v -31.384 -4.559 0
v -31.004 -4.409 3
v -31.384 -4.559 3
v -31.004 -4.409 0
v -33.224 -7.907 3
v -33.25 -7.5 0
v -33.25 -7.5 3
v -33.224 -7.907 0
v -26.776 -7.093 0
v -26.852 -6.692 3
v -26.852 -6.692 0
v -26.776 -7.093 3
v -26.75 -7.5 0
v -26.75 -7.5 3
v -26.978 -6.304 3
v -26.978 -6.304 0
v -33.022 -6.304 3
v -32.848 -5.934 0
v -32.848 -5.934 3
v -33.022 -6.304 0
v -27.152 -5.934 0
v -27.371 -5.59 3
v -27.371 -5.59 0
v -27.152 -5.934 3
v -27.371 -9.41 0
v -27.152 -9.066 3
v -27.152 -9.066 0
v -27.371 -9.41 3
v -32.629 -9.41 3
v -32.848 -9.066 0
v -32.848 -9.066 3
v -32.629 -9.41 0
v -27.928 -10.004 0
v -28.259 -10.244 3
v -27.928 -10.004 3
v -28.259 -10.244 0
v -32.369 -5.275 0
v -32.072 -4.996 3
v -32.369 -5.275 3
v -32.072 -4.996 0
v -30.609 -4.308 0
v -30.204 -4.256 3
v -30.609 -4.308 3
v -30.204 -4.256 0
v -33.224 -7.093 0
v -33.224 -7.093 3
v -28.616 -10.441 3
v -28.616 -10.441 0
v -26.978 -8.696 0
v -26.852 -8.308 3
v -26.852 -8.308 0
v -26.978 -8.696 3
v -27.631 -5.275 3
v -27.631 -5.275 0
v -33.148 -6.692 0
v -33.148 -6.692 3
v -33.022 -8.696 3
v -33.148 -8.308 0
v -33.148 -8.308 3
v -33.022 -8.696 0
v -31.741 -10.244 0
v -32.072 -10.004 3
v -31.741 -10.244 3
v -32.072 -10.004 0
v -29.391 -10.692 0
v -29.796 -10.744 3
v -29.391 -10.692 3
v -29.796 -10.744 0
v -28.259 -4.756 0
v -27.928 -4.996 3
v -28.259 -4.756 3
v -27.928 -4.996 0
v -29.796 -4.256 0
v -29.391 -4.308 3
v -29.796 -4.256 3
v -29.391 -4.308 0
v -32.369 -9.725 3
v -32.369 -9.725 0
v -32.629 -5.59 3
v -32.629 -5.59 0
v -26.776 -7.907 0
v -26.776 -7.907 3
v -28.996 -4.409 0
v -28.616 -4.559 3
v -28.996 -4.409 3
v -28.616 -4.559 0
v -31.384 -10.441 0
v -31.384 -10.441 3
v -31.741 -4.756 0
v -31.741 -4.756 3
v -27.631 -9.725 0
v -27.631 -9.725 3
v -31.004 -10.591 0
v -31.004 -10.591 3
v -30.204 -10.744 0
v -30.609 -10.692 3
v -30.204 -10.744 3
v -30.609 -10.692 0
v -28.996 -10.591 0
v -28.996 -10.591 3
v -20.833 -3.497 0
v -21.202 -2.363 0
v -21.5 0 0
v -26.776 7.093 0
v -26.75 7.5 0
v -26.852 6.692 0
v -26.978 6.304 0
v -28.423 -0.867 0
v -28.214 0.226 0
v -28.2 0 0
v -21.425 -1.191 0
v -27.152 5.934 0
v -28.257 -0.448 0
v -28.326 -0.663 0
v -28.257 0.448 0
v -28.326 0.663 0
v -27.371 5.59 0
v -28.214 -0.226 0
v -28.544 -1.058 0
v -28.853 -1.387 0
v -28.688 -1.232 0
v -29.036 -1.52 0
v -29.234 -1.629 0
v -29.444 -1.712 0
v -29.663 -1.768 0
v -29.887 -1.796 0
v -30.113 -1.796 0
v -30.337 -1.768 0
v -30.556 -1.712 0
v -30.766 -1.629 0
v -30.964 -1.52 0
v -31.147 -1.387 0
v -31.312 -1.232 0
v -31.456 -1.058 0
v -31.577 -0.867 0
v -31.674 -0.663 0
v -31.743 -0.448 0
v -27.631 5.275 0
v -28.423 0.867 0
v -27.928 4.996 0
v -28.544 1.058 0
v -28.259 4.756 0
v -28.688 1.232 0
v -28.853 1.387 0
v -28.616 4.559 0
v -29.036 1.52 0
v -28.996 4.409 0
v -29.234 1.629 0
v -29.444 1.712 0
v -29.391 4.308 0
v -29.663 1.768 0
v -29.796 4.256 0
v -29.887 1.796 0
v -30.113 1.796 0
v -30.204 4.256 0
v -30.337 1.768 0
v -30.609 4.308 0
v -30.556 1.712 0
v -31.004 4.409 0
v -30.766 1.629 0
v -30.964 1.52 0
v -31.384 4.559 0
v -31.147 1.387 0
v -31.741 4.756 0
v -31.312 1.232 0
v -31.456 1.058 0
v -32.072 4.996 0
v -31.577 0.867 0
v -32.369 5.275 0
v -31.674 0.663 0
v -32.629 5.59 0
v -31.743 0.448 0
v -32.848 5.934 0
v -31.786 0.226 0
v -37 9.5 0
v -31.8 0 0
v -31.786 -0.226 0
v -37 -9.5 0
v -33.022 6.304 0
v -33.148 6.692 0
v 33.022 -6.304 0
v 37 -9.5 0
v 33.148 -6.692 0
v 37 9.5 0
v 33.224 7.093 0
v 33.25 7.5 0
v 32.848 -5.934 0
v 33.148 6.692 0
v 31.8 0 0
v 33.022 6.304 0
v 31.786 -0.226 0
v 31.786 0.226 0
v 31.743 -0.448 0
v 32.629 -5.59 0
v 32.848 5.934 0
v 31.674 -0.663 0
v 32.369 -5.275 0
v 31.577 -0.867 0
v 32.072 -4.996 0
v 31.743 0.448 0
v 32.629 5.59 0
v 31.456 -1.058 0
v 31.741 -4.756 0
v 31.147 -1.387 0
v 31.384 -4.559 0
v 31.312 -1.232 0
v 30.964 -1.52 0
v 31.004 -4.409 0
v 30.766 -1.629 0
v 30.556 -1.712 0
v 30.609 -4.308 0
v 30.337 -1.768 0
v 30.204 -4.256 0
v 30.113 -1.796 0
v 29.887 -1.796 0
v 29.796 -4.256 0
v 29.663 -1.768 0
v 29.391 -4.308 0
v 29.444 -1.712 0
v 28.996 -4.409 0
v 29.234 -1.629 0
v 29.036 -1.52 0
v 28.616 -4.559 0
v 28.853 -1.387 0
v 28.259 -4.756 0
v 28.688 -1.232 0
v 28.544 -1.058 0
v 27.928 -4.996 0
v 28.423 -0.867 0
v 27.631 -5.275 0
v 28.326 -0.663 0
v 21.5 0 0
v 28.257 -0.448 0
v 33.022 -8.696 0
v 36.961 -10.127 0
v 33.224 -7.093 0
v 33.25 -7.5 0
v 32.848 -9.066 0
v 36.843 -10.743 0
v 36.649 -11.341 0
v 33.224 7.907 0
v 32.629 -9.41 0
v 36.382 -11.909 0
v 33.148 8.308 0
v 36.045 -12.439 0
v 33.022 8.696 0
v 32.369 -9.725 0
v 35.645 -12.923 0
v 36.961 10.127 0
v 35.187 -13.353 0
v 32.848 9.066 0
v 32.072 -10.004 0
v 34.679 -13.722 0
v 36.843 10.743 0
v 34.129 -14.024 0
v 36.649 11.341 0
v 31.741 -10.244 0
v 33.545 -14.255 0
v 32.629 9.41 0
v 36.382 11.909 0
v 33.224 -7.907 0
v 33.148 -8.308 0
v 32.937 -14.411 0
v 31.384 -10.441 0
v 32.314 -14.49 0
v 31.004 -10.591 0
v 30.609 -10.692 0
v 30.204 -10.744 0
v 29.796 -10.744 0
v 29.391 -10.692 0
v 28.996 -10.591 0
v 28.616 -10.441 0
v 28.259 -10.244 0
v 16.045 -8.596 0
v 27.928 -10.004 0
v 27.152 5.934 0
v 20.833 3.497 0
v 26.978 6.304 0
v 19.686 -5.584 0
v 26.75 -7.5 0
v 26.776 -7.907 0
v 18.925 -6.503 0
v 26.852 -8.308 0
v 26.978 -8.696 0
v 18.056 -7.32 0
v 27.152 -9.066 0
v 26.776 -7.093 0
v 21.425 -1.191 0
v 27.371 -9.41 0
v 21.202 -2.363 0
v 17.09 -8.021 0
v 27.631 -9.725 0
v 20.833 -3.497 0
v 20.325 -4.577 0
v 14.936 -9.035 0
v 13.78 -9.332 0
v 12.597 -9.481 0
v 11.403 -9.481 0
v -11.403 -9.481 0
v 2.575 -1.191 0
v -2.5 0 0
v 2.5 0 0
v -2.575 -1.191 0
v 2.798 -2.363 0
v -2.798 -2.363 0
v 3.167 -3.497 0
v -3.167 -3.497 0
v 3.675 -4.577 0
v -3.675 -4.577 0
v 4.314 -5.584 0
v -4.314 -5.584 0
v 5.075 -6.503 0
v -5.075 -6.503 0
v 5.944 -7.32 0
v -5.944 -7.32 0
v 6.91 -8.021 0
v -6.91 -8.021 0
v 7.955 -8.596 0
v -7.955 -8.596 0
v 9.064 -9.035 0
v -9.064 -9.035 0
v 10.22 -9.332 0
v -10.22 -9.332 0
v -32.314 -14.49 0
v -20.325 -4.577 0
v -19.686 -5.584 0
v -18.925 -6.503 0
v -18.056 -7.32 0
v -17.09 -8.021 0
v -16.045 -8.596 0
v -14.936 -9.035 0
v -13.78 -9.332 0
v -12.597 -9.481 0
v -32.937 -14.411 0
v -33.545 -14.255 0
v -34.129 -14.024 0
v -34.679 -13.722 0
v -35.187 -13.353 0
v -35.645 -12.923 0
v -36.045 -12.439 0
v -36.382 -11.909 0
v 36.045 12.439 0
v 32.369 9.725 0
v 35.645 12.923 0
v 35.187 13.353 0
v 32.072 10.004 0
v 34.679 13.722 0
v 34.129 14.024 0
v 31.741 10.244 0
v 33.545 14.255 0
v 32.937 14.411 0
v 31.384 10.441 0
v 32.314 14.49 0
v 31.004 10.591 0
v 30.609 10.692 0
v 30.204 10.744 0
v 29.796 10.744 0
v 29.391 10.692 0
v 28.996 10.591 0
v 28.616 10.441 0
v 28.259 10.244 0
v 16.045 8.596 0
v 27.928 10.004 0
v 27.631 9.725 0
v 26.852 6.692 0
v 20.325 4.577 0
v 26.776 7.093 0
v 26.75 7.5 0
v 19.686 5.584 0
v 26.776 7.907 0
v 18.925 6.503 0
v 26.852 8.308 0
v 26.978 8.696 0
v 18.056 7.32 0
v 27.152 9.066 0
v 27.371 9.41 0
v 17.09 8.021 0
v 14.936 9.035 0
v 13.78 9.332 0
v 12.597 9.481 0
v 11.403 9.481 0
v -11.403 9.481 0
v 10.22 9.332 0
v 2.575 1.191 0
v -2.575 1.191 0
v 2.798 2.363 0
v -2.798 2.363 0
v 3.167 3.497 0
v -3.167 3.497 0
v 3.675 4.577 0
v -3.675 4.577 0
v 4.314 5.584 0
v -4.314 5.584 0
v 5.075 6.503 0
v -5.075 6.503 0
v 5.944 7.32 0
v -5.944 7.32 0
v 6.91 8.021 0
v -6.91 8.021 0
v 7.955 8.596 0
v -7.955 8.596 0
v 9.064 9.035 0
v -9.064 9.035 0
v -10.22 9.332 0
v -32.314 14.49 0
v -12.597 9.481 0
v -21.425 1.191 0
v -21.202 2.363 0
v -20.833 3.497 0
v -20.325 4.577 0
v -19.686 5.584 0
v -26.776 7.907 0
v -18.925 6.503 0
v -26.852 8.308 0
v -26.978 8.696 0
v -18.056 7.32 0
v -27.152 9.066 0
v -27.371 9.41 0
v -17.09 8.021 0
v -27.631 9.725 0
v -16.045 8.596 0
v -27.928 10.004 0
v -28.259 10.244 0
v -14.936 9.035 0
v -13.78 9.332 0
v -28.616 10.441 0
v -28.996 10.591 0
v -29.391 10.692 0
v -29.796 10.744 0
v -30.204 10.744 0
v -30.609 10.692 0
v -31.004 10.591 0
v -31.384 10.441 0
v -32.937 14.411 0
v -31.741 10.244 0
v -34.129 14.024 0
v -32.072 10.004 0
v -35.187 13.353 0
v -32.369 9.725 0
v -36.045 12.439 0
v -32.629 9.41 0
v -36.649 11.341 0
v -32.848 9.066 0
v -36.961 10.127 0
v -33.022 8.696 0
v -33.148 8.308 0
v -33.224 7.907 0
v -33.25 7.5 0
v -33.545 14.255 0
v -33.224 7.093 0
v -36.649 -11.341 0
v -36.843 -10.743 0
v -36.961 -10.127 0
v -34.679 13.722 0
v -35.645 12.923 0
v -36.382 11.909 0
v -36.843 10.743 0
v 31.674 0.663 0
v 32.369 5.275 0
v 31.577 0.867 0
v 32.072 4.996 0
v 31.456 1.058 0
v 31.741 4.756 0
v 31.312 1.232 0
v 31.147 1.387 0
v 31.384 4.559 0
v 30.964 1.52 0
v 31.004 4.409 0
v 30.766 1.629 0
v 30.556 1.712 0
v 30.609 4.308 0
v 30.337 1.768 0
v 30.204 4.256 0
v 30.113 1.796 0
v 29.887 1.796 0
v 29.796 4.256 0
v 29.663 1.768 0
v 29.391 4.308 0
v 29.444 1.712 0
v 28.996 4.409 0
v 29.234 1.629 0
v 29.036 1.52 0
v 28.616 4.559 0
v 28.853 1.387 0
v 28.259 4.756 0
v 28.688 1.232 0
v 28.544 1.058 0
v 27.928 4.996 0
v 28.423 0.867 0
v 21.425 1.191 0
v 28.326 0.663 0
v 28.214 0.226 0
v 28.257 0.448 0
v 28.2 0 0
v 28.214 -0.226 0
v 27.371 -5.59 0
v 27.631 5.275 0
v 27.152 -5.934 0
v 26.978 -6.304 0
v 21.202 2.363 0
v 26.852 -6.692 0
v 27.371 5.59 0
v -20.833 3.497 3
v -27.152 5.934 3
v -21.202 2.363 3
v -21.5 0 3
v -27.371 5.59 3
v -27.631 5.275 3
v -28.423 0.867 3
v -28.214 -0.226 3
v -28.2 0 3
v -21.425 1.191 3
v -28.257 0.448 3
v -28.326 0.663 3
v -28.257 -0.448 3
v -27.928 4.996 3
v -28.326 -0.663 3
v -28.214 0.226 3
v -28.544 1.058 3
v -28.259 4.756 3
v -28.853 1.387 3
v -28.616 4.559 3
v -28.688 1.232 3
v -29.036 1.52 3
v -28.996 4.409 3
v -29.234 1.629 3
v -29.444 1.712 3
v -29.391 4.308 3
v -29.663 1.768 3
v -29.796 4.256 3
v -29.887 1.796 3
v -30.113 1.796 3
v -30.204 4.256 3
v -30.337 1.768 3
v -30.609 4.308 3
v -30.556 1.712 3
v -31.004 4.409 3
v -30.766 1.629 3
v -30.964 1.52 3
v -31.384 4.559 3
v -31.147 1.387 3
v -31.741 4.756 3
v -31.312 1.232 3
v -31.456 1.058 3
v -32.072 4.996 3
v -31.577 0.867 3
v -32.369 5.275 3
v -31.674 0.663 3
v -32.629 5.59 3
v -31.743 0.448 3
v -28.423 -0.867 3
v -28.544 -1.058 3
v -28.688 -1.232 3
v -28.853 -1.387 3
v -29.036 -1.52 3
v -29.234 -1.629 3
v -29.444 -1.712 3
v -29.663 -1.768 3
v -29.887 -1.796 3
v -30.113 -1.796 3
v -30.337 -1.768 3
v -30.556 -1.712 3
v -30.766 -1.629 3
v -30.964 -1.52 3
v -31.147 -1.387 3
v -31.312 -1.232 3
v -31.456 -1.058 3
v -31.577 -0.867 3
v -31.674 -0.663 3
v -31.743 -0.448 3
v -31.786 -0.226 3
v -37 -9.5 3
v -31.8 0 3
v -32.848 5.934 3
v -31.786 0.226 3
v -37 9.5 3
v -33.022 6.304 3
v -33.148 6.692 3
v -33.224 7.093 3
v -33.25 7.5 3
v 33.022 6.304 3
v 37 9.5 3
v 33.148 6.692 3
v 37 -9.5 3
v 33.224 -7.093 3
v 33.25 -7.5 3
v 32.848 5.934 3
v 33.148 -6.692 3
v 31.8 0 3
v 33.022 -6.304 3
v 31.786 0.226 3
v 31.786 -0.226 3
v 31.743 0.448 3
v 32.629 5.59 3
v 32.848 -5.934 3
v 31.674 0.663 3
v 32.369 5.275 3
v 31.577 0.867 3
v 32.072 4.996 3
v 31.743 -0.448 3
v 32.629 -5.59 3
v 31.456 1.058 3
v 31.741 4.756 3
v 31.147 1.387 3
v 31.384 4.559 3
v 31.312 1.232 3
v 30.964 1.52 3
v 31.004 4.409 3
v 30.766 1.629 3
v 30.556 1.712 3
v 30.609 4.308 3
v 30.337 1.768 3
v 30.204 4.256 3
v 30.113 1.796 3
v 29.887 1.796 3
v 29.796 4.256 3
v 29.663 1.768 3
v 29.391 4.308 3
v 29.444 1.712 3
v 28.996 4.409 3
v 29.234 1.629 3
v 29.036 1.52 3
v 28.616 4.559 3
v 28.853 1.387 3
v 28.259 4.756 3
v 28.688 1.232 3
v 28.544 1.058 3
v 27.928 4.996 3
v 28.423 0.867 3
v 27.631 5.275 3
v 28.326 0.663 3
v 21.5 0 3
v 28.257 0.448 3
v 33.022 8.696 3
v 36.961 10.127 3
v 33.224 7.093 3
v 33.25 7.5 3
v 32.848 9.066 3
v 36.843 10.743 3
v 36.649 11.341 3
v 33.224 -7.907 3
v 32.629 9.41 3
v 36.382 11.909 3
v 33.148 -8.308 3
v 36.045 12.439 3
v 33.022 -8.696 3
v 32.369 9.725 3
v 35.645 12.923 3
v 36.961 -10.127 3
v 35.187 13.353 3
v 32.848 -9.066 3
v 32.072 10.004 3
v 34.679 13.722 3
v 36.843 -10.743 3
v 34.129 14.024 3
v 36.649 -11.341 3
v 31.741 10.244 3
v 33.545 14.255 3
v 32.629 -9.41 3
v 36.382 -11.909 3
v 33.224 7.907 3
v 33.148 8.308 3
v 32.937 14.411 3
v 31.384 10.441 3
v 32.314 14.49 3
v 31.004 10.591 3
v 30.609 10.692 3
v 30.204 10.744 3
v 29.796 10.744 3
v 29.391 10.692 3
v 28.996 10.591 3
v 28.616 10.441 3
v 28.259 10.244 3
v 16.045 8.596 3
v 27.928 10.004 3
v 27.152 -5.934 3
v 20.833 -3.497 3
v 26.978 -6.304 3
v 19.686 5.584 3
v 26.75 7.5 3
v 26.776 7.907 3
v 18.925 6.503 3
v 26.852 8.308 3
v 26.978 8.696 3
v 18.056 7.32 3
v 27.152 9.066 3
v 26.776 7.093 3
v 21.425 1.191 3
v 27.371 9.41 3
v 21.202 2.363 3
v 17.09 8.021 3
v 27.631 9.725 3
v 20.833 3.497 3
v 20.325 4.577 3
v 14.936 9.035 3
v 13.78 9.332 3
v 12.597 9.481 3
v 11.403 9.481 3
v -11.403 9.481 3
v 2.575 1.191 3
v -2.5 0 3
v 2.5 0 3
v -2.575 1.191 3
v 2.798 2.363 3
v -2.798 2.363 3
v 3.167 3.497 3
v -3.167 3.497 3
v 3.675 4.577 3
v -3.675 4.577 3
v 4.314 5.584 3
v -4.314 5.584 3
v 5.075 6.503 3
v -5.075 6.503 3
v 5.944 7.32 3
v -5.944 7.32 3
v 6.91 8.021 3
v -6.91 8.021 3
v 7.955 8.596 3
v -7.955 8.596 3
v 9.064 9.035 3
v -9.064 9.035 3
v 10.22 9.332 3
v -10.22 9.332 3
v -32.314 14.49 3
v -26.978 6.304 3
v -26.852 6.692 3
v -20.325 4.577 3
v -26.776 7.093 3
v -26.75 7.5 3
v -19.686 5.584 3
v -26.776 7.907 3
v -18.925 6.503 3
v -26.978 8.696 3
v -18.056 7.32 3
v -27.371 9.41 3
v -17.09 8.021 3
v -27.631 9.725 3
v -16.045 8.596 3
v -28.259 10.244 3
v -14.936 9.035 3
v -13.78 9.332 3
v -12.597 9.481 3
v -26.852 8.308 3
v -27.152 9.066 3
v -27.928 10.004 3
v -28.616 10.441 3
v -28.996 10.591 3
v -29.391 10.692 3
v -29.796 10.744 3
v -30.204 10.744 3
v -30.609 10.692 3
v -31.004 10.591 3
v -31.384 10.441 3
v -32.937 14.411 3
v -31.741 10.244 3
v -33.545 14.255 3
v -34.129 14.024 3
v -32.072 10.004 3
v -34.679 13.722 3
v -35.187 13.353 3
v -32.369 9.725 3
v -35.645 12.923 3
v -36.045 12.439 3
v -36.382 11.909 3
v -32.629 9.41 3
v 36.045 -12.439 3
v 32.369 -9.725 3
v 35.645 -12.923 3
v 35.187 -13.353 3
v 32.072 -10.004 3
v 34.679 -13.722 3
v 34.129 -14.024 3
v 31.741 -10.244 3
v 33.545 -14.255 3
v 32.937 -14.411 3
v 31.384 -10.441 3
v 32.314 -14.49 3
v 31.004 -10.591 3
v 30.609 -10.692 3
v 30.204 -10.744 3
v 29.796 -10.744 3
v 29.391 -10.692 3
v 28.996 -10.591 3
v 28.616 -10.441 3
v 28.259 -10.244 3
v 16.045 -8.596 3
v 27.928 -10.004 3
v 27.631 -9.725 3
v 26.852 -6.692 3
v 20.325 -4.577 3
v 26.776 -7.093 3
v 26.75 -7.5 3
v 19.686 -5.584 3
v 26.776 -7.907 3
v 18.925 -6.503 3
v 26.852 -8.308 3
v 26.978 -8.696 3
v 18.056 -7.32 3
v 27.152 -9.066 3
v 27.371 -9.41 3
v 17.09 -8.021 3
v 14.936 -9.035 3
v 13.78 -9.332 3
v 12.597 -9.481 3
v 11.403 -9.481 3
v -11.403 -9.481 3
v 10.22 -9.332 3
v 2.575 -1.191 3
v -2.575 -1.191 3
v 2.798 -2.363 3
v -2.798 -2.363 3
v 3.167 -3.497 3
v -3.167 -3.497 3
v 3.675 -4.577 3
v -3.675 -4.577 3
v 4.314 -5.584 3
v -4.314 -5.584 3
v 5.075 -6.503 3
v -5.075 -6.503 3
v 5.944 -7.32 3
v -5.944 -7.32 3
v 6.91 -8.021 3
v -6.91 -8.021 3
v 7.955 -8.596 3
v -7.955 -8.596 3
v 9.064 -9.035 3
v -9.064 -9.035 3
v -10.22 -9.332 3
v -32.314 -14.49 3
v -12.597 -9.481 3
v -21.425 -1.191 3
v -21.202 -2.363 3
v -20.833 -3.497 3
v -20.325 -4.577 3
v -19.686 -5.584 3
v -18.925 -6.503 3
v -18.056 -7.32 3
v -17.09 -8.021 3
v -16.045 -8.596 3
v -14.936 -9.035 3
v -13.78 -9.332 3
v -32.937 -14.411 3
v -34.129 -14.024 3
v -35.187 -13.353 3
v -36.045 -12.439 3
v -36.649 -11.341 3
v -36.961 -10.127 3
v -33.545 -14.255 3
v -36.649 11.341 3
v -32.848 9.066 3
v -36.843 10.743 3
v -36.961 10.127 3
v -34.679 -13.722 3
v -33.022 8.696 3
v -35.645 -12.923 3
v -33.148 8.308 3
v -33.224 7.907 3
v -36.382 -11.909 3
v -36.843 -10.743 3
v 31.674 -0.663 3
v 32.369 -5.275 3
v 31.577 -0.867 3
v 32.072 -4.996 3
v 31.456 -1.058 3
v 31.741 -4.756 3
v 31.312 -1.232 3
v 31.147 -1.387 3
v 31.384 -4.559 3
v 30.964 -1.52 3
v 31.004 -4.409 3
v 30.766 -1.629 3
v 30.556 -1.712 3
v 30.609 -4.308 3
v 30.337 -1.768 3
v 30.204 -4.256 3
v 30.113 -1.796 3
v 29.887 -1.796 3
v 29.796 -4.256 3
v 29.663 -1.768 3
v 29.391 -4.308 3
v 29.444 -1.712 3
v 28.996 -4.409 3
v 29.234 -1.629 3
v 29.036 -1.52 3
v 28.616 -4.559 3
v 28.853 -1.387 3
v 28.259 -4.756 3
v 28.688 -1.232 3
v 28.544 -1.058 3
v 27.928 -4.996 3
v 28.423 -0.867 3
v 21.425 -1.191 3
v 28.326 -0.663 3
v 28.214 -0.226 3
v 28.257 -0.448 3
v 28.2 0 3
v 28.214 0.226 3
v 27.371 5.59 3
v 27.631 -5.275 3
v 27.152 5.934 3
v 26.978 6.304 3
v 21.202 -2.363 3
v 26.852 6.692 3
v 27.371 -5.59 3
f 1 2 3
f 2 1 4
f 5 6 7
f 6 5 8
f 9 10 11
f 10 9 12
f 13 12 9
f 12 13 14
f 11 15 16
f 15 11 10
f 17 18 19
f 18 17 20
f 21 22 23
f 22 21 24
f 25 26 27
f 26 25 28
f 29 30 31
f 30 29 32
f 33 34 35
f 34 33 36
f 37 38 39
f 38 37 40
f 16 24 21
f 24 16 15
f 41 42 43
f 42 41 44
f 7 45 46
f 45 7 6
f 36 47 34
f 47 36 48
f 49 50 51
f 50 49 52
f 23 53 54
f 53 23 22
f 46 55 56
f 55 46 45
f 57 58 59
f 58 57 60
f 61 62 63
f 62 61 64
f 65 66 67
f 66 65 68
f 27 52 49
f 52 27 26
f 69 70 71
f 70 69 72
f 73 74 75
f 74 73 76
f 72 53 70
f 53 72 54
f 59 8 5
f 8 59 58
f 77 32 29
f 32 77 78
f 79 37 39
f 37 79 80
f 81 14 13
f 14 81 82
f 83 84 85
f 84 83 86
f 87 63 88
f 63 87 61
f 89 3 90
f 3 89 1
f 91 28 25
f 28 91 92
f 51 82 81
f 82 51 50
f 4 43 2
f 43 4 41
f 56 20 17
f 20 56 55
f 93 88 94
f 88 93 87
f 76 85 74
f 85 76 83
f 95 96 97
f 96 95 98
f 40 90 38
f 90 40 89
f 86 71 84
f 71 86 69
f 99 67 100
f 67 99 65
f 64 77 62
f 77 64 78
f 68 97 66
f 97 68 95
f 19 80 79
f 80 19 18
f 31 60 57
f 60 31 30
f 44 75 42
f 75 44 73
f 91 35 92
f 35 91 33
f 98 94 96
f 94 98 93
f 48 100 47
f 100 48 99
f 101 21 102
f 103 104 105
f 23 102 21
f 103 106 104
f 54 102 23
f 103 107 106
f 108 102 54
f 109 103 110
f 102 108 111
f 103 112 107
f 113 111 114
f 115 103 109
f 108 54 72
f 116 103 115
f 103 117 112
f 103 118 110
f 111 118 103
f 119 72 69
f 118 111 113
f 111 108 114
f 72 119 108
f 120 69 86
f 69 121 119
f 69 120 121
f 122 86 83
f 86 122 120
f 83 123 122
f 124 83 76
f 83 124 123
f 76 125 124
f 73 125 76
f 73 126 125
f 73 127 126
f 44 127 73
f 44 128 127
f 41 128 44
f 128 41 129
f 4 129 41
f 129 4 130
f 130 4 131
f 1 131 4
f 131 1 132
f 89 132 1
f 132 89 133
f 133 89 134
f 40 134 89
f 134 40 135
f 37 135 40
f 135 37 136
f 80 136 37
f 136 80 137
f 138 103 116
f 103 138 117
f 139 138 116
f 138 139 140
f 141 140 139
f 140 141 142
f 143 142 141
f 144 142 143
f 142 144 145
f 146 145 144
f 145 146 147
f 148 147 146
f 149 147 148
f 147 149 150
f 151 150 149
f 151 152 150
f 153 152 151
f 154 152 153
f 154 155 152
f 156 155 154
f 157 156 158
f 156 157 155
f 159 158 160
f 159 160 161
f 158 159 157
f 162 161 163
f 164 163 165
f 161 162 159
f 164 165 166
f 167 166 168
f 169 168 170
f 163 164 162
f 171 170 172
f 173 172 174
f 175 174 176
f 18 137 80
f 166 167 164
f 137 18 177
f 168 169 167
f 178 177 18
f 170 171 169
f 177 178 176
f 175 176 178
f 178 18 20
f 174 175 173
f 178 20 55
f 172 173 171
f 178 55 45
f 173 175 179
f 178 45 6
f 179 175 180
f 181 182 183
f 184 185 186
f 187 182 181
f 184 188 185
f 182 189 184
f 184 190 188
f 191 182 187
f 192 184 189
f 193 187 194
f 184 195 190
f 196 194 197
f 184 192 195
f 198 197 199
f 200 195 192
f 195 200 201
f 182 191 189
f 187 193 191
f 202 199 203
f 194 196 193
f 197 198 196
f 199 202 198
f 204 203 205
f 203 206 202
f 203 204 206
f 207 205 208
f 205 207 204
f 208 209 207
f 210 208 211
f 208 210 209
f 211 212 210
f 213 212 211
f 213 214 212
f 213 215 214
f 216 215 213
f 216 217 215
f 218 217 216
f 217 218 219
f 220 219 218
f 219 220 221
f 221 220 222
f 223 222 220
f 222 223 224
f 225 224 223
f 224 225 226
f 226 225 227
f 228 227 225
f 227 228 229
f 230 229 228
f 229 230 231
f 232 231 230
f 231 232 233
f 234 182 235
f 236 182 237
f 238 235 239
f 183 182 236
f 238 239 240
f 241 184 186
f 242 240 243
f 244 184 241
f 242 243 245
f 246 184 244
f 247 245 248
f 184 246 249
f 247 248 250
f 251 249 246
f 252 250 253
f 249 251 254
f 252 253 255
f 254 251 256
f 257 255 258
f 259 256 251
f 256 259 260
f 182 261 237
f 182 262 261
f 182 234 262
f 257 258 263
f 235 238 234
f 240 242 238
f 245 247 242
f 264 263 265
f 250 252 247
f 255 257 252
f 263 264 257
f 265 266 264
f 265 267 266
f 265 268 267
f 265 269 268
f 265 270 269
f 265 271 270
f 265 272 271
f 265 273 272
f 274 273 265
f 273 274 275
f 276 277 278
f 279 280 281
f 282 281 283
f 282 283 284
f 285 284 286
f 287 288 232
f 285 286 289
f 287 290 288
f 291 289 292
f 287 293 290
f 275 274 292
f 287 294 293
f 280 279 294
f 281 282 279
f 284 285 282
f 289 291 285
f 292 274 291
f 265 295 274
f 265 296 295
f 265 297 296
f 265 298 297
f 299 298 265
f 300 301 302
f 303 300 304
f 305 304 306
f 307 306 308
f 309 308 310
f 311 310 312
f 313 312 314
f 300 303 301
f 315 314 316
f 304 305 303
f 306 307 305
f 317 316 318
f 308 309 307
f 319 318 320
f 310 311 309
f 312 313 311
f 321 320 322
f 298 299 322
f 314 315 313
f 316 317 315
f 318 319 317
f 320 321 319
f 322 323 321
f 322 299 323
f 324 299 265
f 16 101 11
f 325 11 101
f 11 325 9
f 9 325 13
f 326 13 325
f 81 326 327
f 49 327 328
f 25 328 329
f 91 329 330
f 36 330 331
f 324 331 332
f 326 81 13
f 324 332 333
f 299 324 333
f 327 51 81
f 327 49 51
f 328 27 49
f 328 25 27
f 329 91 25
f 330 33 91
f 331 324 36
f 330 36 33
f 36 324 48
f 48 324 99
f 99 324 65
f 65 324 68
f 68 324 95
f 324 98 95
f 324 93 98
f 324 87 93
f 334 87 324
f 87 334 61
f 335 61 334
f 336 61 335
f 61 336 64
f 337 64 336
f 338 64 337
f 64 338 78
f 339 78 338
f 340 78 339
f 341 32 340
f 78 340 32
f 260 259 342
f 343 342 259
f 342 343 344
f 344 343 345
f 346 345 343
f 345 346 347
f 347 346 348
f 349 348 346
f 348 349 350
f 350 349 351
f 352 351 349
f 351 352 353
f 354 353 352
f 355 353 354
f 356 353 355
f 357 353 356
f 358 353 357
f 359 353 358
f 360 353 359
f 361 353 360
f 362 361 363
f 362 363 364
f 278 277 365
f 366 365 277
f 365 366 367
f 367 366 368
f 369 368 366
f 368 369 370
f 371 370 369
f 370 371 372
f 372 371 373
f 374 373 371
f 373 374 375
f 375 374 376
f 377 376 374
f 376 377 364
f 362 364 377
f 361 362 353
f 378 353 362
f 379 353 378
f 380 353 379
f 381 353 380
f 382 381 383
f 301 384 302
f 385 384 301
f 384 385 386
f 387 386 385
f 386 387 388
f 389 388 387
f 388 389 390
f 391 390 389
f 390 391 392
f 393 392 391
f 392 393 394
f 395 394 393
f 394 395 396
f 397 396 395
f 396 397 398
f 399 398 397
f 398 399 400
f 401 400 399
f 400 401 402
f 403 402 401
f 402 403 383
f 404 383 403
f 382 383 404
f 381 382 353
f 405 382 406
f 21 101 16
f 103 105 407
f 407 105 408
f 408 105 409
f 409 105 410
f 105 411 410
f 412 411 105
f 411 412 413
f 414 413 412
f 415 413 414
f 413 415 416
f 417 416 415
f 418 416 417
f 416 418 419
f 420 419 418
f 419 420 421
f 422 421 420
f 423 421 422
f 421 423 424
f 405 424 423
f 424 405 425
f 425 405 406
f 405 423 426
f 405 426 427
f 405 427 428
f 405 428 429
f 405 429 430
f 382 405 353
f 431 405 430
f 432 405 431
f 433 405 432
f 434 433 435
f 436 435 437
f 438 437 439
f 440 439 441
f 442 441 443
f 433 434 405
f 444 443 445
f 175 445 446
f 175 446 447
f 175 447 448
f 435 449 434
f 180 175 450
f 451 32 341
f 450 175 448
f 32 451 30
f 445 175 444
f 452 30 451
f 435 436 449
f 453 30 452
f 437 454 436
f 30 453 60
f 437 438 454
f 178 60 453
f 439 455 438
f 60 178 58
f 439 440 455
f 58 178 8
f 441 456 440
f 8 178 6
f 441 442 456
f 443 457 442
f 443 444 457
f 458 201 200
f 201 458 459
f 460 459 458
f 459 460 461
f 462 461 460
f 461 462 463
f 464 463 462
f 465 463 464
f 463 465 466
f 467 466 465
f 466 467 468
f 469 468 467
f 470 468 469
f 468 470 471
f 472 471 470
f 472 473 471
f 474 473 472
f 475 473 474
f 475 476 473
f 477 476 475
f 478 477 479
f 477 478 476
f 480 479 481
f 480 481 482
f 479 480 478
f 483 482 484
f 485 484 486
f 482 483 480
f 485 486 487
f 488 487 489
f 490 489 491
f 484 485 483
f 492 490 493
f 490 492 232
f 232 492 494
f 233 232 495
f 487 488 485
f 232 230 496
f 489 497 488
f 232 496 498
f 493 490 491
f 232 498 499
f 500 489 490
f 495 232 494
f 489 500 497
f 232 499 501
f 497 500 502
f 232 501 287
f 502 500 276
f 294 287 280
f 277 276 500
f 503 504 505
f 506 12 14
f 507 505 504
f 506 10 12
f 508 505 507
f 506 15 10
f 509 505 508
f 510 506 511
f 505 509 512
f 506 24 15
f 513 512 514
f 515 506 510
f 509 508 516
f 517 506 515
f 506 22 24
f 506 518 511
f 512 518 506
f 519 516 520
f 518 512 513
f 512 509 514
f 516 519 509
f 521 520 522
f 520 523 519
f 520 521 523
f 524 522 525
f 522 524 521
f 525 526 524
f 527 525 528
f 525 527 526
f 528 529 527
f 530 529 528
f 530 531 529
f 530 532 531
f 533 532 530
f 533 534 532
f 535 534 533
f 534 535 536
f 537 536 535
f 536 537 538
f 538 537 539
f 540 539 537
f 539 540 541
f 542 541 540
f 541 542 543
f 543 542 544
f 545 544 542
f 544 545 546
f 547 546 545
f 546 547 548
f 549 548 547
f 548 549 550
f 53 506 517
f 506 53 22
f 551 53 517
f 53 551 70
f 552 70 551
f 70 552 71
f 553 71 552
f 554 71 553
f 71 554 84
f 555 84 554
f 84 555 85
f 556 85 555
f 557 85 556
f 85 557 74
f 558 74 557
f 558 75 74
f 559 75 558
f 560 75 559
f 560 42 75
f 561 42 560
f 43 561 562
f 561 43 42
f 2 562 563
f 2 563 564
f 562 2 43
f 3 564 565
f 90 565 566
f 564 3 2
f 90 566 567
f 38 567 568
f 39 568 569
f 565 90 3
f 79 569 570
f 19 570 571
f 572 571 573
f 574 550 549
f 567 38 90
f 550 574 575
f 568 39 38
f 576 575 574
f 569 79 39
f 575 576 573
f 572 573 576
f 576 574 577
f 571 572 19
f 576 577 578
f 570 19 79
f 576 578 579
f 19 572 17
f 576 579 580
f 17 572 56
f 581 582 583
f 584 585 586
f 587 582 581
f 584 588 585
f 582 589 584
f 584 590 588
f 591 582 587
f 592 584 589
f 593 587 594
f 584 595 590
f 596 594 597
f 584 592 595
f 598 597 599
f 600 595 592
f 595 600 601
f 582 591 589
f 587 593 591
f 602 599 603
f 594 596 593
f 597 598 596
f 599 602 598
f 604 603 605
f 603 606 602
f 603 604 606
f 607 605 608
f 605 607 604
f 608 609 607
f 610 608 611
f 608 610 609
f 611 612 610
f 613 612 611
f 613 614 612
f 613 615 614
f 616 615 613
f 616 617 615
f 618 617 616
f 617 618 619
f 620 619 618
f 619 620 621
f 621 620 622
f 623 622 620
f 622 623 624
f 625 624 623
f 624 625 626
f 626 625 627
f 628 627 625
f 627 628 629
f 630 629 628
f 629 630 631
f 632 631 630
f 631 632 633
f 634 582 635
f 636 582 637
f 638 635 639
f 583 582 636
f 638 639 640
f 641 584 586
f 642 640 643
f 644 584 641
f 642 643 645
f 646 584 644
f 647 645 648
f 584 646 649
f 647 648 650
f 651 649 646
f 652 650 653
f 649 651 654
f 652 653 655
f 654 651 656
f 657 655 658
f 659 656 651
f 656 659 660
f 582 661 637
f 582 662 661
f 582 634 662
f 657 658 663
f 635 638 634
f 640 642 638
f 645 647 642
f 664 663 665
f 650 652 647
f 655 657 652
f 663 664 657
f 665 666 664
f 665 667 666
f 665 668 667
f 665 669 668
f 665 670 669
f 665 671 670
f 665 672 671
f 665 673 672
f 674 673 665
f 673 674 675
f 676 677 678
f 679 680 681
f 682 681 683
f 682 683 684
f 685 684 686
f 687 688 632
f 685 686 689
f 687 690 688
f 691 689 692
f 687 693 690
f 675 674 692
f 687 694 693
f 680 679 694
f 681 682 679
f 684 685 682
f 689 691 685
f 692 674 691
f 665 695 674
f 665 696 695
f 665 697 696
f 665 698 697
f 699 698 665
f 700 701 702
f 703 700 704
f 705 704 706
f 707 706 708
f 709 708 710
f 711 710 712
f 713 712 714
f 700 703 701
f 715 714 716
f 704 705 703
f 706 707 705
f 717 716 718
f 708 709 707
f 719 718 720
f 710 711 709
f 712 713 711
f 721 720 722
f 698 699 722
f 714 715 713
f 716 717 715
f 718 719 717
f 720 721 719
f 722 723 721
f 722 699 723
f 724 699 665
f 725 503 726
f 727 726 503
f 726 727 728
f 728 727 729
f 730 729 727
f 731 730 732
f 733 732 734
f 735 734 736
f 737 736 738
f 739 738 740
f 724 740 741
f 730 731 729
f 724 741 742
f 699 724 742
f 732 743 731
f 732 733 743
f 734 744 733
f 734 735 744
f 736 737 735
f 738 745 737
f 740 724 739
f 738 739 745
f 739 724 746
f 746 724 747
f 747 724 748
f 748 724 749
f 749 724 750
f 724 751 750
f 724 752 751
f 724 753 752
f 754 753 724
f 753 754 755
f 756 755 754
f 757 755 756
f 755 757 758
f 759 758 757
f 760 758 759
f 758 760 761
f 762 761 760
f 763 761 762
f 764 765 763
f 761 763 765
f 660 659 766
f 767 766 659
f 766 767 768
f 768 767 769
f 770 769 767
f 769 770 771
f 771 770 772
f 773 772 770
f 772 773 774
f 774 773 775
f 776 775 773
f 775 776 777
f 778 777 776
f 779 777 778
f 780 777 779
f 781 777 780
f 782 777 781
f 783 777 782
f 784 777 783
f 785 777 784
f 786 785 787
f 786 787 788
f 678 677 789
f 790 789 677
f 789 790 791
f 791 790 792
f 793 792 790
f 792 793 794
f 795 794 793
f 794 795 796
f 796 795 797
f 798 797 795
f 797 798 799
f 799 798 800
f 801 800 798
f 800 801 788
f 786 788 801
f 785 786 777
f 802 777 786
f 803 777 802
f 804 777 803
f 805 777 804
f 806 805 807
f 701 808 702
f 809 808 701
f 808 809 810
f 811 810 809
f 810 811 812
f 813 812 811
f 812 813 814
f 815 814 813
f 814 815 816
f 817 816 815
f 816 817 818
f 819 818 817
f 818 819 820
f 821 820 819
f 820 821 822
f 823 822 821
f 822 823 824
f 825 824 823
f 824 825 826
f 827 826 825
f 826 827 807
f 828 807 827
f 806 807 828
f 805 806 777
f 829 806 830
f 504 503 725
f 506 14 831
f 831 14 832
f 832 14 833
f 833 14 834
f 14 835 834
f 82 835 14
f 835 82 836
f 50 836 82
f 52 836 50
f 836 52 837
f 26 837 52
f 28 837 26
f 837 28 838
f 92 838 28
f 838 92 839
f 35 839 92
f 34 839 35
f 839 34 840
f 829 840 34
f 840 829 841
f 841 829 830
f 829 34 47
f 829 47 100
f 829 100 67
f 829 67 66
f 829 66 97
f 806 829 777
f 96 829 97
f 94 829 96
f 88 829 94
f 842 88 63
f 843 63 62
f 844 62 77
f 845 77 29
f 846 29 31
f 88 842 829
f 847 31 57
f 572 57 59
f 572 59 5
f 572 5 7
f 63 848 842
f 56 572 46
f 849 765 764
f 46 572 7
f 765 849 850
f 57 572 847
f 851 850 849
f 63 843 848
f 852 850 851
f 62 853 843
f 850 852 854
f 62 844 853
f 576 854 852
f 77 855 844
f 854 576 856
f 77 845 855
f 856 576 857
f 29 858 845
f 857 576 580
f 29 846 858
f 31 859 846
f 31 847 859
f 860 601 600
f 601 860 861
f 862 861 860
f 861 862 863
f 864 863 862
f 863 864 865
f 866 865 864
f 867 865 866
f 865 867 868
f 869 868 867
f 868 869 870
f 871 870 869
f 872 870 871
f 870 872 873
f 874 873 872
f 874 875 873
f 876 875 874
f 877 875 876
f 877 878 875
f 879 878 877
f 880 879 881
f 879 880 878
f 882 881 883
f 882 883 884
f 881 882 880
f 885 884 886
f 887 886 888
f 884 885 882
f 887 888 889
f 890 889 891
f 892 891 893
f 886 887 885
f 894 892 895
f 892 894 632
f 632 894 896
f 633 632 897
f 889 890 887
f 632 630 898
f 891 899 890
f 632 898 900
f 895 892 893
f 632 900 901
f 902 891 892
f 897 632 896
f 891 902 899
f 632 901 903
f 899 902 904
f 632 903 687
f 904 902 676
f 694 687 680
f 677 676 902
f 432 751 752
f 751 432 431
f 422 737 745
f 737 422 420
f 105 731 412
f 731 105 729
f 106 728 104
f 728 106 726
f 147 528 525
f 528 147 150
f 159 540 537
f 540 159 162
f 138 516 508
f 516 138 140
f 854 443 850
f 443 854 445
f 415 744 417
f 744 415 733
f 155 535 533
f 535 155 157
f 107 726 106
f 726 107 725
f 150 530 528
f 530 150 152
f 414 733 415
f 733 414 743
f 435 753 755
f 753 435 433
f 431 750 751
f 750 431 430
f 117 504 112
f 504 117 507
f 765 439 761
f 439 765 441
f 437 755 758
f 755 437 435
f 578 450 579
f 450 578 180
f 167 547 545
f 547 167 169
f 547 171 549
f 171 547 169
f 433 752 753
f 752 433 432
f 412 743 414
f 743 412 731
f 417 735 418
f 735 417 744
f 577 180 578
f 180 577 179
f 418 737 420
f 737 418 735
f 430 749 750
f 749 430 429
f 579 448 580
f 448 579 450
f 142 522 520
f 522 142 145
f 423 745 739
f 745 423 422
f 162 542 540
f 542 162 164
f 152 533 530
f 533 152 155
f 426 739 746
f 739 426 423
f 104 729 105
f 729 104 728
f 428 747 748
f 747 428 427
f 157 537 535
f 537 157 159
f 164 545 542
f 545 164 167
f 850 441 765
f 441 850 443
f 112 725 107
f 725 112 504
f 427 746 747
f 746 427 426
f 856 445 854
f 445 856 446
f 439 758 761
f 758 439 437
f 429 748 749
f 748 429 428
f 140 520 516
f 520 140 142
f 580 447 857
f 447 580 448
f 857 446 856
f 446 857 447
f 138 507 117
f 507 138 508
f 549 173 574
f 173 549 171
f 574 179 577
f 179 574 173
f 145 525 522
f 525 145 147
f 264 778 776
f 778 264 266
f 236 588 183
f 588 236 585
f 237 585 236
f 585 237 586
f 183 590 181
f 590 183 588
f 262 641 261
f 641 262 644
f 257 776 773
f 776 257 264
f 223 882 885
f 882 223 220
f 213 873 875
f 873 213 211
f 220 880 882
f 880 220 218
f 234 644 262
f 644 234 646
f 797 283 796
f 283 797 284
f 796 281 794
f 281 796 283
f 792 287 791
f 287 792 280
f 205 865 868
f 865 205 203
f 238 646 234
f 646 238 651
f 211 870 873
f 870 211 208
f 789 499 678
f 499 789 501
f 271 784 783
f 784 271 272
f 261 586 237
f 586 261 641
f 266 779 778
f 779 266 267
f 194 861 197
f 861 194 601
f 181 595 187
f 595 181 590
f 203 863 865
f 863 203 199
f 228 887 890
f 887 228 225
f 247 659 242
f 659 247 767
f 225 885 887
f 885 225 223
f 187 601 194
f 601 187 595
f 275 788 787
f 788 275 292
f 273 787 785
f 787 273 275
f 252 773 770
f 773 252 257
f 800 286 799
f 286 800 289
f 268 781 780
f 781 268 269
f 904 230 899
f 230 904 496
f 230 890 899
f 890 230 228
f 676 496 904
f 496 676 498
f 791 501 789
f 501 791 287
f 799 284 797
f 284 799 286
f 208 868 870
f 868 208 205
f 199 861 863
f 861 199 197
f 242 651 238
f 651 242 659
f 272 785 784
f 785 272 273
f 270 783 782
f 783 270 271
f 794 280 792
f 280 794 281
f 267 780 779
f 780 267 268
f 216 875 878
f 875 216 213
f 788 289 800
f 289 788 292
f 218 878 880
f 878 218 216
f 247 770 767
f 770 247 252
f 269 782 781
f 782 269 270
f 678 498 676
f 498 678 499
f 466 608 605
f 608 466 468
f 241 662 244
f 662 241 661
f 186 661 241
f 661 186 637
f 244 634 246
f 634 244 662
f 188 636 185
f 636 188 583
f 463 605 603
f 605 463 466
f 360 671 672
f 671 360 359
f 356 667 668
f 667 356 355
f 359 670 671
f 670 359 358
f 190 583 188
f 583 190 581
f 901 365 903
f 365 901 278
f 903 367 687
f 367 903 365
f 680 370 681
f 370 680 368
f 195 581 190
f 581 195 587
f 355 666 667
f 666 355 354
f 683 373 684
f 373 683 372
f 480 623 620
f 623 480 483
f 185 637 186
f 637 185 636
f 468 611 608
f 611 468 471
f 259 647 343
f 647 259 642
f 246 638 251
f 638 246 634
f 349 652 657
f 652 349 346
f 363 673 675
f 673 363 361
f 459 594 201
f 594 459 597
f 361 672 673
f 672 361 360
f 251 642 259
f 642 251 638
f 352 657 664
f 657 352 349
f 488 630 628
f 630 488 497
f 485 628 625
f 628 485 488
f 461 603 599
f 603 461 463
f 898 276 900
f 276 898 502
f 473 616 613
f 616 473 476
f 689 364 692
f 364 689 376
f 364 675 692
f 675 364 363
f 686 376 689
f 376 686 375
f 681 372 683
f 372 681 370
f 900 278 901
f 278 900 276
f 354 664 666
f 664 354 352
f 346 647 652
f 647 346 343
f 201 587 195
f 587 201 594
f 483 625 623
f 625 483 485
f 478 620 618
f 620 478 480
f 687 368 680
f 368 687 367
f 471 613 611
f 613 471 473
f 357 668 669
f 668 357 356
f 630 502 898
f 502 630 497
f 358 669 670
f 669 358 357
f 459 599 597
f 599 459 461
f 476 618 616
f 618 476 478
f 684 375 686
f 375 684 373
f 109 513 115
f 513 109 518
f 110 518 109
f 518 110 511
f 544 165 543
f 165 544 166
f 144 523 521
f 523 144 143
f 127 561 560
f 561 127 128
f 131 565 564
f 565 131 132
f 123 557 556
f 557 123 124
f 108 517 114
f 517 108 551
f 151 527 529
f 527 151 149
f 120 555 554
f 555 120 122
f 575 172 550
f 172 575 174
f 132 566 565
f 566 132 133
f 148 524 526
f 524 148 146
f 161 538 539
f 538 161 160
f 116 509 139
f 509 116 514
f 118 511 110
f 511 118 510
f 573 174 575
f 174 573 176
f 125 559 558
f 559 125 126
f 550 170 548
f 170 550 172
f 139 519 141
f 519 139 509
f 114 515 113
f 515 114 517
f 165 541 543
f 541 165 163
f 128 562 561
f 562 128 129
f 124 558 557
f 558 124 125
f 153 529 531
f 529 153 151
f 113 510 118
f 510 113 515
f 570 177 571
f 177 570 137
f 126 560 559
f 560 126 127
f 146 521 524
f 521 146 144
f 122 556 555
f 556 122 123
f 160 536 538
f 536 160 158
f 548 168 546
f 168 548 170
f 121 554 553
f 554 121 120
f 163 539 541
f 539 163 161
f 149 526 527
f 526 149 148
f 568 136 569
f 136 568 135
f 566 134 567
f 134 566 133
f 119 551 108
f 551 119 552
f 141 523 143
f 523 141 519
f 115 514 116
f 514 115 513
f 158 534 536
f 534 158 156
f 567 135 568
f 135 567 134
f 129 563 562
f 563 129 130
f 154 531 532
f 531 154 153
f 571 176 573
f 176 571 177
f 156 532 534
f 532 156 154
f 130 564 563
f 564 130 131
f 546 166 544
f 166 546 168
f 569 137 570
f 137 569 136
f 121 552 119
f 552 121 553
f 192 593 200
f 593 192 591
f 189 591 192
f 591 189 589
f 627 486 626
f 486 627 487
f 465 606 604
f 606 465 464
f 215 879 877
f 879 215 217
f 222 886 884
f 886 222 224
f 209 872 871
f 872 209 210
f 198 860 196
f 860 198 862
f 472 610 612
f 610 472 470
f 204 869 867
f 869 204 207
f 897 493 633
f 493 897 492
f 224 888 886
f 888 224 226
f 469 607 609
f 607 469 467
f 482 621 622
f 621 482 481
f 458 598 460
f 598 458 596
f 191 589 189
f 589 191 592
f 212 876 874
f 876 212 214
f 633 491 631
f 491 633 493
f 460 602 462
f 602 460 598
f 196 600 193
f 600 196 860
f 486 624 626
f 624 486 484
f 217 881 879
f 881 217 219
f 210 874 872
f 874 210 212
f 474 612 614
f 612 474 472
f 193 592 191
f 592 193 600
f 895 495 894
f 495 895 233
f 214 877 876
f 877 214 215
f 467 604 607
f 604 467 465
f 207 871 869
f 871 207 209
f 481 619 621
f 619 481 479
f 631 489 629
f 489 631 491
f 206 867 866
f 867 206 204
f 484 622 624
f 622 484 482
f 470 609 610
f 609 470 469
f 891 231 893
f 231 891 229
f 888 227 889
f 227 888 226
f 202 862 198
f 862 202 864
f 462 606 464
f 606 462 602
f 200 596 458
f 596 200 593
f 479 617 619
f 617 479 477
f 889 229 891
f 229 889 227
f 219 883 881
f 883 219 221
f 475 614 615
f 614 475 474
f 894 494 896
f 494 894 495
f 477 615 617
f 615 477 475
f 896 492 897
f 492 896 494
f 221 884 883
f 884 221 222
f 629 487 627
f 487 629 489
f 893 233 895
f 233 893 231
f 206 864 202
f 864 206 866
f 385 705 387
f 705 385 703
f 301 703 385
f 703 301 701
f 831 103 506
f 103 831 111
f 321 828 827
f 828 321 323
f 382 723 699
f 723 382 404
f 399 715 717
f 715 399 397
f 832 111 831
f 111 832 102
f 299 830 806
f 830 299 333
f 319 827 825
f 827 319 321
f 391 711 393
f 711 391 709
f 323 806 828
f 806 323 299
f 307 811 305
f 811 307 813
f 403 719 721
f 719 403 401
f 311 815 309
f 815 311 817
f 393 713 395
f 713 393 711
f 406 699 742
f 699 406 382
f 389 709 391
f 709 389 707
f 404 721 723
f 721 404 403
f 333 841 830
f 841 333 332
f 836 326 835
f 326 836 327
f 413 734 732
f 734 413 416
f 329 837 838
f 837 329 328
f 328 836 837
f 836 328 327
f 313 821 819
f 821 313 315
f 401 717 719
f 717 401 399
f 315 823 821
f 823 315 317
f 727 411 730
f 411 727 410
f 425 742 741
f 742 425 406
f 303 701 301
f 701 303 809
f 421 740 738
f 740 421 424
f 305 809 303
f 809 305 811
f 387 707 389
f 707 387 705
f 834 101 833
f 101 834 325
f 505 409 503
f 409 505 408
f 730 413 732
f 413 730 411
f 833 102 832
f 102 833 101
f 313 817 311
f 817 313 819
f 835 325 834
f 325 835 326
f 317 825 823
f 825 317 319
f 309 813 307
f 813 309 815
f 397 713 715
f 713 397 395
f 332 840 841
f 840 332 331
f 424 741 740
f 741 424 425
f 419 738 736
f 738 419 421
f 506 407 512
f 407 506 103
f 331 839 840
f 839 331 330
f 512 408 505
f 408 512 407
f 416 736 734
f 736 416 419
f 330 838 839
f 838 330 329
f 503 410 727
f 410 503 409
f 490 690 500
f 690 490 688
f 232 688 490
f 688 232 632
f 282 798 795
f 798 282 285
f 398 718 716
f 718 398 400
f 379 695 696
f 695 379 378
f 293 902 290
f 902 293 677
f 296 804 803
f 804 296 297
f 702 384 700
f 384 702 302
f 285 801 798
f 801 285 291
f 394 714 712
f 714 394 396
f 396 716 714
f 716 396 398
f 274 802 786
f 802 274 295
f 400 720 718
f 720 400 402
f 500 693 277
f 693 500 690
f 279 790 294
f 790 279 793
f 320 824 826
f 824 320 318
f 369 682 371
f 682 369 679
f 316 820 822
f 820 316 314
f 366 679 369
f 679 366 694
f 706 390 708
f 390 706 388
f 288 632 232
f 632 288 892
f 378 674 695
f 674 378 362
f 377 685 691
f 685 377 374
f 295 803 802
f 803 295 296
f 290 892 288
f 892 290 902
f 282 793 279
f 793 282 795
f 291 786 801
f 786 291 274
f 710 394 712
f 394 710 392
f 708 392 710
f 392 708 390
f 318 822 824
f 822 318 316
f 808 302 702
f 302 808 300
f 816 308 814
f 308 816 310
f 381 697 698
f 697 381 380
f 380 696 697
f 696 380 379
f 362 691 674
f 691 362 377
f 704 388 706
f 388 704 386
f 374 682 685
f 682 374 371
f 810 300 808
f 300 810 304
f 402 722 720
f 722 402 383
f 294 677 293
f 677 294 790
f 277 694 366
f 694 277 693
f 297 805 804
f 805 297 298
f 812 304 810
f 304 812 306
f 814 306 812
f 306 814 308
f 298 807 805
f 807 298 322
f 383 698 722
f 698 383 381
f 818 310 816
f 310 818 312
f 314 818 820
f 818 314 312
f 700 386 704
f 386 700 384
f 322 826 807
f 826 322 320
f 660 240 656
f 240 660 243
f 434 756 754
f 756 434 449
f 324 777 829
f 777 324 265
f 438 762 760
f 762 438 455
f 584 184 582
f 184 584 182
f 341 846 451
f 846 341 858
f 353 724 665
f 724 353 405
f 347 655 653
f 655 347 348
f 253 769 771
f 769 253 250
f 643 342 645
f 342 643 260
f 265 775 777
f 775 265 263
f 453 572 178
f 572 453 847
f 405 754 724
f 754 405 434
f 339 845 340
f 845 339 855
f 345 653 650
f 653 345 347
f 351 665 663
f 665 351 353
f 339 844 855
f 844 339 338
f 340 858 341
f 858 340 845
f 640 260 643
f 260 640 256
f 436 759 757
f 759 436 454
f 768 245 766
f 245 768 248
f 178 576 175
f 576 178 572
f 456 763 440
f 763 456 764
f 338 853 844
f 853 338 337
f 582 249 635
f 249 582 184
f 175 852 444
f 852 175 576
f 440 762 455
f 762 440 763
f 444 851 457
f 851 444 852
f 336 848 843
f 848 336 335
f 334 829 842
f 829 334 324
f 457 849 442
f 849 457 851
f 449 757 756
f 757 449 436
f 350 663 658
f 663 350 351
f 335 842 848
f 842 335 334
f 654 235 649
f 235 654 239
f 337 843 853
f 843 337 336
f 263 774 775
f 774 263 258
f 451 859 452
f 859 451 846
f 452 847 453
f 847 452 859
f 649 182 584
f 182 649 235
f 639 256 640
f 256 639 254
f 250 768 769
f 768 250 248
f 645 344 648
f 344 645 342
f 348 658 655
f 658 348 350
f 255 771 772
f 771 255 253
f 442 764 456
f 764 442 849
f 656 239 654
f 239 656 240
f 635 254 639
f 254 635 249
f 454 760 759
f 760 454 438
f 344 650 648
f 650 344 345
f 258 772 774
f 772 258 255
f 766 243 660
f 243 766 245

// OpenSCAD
$fn = 50;

difference() {
	union() {
		hull() {
			translate(v = [-32.0, 9.5, 0]) {
				cylinder(h = 3, r = 5);
			}
			translate(v = [32.0, 9.5, 0]) {
				cylinder(h = 3, r = 5);
			}
			translate(v = [-32.0, -9.5, 0]) {
				cylinder(h = 3, r = 5);
			}
			translate(v = [32.0, -9.5, 0]) {
				cylinder(h = 3, r = 5);
			}
		}
	}
	union() {
		translate(v = [-30.0, -7.5, 0]) {
			cylinder(h = 3, r = 3.25);
		}
		translate(v = [-30.0, 7.5, 0]) {
			cylinder(h = 3, r = 3.25);
		}
		translate(v = [30.0, -7.5, 0]) {
			cylinder(h = 3, r = 3.25);
		}
		translate(v = [30.0, 7.5, 0]) {
			cylinder(h = 3, r = 3.25);
		}
		translate(v = [-30.0, 0.0, 0]) {
			cylinder(h = 3, r = 1.8);
		}
		translate(v = [30.0, 0.0, 0]) {
			cylinder(h = 3, r = 1.8);
		}
		translate(v = [-12.0, 0, 0.0]) {
			cylinder(h = 3, r = 9.5);
		}
		translate(v = [12.0, 0, 0.0]) {
			cylinder(h = 3, r = 9.5);
		}
	}
}
